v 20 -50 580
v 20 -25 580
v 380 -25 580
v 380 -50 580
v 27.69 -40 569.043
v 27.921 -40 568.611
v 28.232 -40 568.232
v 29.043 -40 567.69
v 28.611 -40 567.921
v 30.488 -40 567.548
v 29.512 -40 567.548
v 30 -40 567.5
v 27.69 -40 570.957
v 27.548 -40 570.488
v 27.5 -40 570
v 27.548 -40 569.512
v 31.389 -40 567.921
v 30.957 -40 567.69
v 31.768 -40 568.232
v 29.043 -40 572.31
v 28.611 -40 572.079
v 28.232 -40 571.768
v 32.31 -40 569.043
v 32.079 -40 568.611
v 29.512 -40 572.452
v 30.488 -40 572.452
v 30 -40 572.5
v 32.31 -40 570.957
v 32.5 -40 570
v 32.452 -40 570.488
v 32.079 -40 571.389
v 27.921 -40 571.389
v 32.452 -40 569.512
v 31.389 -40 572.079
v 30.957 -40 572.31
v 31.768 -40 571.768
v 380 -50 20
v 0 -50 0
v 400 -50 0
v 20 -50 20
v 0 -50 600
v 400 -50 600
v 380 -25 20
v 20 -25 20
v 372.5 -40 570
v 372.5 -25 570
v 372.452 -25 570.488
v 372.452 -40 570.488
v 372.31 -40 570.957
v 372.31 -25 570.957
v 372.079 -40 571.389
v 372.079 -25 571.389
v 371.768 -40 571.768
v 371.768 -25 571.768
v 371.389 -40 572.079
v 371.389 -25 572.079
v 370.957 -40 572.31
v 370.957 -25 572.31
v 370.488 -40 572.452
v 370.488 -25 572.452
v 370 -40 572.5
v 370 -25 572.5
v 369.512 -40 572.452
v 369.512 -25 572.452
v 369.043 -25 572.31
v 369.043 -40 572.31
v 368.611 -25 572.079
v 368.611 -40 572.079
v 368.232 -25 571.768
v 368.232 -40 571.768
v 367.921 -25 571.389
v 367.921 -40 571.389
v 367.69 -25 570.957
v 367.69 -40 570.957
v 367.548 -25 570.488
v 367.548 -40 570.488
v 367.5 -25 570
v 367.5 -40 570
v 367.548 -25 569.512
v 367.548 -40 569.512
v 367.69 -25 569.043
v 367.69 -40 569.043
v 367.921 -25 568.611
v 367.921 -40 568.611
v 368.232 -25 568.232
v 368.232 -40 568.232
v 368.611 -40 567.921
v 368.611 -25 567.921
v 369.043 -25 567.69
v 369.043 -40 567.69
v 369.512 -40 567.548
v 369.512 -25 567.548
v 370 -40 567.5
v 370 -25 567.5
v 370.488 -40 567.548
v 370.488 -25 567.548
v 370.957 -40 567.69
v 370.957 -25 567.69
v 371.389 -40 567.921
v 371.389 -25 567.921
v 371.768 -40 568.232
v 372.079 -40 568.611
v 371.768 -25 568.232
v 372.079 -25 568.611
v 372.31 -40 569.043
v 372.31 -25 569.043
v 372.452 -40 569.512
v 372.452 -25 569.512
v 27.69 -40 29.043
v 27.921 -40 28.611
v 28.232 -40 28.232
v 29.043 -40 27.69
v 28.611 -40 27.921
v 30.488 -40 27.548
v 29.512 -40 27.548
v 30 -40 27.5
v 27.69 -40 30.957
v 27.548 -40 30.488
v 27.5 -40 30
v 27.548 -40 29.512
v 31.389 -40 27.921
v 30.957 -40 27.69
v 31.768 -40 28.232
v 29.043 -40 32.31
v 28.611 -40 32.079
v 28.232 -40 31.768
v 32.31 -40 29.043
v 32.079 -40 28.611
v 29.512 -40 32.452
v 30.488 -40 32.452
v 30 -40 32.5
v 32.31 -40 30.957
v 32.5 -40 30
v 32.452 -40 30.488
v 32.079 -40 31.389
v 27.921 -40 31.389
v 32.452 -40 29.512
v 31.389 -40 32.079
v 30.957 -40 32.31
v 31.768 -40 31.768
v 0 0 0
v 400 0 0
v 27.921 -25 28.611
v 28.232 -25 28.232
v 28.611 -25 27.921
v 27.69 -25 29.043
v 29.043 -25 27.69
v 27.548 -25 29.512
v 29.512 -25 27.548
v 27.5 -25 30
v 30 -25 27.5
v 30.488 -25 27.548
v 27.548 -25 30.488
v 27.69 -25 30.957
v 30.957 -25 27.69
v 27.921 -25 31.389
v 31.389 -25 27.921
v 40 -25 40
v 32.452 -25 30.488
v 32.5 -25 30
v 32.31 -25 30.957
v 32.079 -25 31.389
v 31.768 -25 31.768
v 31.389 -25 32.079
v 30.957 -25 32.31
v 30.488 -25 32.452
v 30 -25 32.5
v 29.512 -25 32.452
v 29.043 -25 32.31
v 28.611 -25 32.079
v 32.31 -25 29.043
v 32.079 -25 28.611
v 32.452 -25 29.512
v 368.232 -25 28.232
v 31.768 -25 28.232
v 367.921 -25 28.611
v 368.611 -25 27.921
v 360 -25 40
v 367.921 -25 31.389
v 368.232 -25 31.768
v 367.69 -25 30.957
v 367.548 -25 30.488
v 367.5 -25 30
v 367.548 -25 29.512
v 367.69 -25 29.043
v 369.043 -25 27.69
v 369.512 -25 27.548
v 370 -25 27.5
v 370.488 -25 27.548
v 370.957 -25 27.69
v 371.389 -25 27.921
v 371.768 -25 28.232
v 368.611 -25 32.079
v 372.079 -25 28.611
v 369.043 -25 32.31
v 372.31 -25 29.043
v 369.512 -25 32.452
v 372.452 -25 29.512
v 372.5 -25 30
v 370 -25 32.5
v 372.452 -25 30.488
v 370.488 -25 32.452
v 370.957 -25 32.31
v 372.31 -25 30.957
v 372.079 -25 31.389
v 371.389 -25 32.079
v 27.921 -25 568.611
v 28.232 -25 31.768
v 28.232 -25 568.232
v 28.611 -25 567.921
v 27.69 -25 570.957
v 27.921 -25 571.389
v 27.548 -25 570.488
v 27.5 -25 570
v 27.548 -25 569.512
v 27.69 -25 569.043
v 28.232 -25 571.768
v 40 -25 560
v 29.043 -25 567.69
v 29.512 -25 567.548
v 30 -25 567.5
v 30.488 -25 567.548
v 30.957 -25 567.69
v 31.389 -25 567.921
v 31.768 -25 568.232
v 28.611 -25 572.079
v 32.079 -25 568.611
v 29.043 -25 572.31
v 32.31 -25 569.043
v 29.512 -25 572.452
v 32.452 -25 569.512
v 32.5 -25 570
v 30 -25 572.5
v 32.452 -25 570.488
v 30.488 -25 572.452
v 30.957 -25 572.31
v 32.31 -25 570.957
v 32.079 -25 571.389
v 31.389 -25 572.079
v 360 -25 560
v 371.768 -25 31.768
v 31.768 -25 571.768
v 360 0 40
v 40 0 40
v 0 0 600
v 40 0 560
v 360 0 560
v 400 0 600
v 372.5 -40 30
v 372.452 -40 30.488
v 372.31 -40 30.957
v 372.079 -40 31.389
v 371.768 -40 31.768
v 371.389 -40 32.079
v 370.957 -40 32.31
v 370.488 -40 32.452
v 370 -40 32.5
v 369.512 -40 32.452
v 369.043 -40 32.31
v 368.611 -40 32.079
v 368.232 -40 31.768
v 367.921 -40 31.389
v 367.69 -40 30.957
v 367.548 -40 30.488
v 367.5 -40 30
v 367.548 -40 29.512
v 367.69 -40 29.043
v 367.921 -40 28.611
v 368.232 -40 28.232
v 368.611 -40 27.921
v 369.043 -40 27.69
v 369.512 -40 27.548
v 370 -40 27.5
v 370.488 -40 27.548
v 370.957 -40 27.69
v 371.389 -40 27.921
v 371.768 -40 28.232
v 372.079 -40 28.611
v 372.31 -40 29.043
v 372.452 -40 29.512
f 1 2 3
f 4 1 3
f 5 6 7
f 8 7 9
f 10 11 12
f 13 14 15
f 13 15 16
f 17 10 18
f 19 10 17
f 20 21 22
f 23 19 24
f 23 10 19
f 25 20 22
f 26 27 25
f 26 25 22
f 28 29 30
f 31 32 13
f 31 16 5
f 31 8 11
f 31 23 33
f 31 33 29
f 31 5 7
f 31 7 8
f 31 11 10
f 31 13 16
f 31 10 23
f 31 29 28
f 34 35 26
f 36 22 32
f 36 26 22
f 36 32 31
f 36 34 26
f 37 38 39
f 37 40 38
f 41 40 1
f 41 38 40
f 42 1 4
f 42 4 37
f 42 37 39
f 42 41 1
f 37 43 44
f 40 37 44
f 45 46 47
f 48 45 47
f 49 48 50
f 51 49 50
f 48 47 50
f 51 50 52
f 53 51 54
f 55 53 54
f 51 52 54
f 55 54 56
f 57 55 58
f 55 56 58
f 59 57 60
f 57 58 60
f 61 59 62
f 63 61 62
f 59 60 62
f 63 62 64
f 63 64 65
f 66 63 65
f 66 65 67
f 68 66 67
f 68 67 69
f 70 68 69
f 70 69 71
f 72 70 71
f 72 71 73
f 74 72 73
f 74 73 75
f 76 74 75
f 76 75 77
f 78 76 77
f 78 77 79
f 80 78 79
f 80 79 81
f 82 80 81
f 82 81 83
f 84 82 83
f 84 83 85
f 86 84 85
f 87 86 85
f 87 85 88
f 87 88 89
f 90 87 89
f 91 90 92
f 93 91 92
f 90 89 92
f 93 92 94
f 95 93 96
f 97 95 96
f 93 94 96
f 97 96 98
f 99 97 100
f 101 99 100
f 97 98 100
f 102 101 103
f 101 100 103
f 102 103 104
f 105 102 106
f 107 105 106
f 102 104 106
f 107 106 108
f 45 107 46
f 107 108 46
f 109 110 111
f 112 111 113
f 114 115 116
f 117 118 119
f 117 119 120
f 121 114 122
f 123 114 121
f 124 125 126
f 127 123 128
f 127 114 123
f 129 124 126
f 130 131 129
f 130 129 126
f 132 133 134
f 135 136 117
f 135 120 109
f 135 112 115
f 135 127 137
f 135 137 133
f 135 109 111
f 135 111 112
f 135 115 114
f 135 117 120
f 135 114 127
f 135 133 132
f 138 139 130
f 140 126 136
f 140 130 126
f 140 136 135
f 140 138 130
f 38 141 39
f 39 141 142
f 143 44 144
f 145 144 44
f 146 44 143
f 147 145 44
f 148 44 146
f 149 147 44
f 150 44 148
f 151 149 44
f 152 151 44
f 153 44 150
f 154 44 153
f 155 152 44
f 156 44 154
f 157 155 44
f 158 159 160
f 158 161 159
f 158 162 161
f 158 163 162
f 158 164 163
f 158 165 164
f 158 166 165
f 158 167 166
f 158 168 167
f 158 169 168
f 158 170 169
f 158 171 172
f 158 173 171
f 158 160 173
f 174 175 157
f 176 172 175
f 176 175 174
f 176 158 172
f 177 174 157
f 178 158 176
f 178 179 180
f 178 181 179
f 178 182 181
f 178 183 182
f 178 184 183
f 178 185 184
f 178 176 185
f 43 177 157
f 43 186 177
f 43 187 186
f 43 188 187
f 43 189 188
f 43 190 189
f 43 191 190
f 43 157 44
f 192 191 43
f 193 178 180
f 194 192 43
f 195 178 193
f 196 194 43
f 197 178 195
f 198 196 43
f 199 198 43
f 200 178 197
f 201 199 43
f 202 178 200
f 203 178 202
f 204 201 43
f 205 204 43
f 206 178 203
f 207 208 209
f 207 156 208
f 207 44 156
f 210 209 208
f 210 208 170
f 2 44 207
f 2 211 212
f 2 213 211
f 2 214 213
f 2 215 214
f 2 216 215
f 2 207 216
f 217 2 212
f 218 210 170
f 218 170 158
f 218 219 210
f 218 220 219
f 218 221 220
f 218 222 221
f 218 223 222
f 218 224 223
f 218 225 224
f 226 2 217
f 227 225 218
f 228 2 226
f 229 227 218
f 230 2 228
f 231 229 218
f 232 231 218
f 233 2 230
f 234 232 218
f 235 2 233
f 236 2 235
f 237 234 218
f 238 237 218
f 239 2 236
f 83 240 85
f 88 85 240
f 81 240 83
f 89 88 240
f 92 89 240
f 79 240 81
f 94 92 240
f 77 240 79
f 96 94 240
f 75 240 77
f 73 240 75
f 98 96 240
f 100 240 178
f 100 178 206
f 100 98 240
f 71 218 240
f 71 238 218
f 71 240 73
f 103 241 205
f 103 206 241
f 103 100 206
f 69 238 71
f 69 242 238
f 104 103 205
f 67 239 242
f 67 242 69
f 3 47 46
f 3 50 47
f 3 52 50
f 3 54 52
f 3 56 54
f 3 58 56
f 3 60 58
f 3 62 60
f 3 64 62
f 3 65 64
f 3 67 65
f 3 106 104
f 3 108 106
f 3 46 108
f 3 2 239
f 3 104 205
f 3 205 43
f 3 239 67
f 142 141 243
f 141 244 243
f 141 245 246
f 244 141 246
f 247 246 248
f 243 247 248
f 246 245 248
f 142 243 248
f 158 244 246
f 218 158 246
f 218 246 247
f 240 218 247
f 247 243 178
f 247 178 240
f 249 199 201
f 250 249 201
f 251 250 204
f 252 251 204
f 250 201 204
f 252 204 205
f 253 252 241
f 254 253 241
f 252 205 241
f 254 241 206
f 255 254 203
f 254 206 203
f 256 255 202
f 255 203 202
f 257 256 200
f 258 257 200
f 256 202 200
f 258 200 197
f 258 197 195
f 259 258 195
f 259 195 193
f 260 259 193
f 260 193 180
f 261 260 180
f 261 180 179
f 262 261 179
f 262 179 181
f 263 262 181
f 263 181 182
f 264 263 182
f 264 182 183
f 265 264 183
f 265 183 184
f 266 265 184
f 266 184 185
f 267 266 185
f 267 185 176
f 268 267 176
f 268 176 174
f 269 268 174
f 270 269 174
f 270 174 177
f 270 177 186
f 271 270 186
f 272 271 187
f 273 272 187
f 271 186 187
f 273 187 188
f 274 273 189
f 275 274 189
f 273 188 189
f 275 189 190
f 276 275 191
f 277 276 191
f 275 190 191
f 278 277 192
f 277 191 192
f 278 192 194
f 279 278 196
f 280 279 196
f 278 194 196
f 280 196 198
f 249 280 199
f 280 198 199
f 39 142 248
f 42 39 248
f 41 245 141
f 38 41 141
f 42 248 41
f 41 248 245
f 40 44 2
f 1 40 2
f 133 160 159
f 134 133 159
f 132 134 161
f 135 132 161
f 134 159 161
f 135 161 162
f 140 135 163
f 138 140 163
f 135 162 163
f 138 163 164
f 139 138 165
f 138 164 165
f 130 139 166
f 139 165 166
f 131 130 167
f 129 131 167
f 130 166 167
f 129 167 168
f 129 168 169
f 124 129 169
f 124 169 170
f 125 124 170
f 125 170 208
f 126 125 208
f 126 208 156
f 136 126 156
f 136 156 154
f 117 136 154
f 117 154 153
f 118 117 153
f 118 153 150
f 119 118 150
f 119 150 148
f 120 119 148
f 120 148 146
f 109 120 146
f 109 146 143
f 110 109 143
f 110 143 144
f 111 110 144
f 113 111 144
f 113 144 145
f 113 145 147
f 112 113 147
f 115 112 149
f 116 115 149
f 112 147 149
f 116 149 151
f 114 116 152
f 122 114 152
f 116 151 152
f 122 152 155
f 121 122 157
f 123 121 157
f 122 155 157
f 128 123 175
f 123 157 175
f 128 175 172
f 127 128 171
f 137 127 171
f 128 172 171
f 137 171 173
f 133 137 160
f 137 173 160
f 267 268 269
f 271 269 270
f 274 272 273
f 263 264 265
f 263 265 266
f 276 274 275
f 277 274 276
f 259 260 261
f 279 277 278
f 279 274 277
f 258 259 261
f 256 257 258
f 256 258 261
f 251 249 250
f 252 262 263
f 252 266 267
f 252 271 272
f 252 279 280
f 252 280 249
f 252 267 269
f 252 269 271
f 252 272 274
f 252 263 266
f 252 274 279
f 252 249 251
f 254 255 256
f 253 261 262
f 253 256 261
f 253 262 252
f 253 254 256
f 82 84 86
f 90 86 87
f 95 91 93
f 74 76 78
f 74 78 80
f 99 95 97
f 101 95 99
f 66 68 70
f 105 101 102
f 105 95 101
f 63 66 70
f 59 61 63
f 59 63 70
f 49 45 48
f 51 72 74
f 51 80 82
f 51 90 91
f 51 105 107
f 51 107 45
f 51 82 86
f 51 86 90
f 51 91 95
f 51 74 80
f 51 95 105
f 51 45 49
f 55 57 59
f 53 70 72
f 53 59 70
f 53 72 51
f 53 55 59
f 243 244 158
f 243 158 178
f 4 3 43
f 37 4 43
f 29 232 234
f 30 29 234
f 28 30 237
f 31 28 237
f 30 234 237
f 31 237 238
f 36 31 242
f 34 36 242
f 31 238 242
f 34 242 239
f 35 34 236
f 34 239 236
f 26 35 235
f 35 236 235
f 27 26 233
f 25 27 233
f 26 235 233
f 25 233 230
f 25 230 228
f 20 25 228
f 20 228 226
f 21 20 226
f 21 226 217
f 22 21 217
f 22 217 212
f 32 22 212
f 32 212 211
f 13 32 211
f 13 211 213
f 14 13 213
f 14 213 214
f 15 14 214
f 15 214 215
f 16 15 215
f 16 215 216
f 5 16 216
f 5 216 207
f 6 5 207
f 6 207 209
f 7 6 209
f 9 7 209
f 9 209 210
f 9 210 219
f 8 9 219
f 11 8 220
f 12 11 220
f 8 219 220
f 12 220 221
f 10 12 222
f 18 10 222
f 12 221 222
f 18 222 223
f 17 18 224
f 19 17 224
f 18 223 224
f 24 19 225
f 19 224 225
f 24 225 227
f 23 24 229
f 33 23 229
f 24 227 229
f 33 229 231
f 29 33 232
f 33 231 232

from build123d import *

# Parameters (mm, degrees)
F0_W     = 20
F0_H     = 20
F0_W_2   = 320
F0_H_2   = 520
F1_DEPTH = 50
F0_R     = 2.5
F2_DEPTH = 25
F3_DEPTH = 40


with BuildPart() as f1:
    # F0 (on Front) → F1 (new body)
    with BuildSketch(Plane.XZ):
        with Locations((390, 10)):
            Rectangle(F0_W, F0_H)
        with Locations((370, 10)):
            Rectangle(F0_W, F0_H)
        with Locations((200, 10)):
            Rectangle(F0_W_2, F0_H)
        with Locations((390, 300)):
            Rectangle(F0_W, F0_H_2)
        with Locations((390, 30)):
            Rectangle(F0_W, F0_H)
        with Locations((30, 10)):
            Rectangle(F0_W, F0_H)
        with Locations((10, 10)):
            Rectangle(F0_W, F0_H)
        with Locations((10, 30)):
            Rectangle(F0_W, F0_H)
        with Locations((10, 300)):
            Rectangle(F0_W, F0_H_2)
        with Locations((390, 570)):
            Rectangle(F0_W, F0_H)
        with Locations((390, 590)):
            Rectangle(F0_W, F0_H)
        with Locations((370, 590)):
            Rectangle(F0_W, F0_H)
        with Locations((200, 590)):
            Rectangle(F0_W_2, F0_H)
        with Locations((30, 590)):
            Rectangle(F0_W, F0_H)
        with Locations((10, 590)):
            Rectangle(F0_W, F0_H)
        with Locations((10, 570)):
            Rectangle(F0_W, F0_H)
    extrude(amount=F1_DEPTH)

    # F0 (on Front) → F2 (join)
    with BuildSketch(Plane.XZ):
        with Locations((370, 570)):
            Rectangle(F0_W, F0_H)
        with Locations((370, 570)):
            Circle(F0_R, mode=Mode.SUBTRACT)
        with Locations((200, 570)):
            Rectangle(F0_W_2, F0_H)
        with Locations((370, 300)):
            Rectangle(F0_W, F0_H_2)
        with Locations((30, 570)):
            Rectangle(F0_W, F0_H)
        with Locations((30, 570)):
            Circle(F0_R, mode=Mode.SUBTRACT)
        with Locations((30, 300)):
            Rectangle(F0_W, F0_H_2)
        with Locations((30, 30)):
            Rectangle(F0_W, F0_H)
        with Locations((30, 30)):
            Circle(F0_R, mode=Mode.SUBTRACT)
        with Locations((200, 30)):
            Rectangle(F0_W_2, F0_H)
        with Locations((370, 30)):
            Rectangle(F0_W, F0_H)
        with Locations((370, 30)):
            Circle(F0_R, mode=Mode.SUBTRACT)
    extrude(amount=F2_DEPTH)

    # F0 (on Front) → F3 (join)
    with BuildSketch(Plane.XZ):
        with Locations((370, 30)):
            Circle(F0_R)
        with Locations((30, 30)):
            Circle(F0_R)
        with Locations((30, 570)):
            Circle(F0_R)
        with Locations((370, 570)):
            Circle(F0_R)
    extrude(amount=F3_DEPTH)


solid = f1.part
